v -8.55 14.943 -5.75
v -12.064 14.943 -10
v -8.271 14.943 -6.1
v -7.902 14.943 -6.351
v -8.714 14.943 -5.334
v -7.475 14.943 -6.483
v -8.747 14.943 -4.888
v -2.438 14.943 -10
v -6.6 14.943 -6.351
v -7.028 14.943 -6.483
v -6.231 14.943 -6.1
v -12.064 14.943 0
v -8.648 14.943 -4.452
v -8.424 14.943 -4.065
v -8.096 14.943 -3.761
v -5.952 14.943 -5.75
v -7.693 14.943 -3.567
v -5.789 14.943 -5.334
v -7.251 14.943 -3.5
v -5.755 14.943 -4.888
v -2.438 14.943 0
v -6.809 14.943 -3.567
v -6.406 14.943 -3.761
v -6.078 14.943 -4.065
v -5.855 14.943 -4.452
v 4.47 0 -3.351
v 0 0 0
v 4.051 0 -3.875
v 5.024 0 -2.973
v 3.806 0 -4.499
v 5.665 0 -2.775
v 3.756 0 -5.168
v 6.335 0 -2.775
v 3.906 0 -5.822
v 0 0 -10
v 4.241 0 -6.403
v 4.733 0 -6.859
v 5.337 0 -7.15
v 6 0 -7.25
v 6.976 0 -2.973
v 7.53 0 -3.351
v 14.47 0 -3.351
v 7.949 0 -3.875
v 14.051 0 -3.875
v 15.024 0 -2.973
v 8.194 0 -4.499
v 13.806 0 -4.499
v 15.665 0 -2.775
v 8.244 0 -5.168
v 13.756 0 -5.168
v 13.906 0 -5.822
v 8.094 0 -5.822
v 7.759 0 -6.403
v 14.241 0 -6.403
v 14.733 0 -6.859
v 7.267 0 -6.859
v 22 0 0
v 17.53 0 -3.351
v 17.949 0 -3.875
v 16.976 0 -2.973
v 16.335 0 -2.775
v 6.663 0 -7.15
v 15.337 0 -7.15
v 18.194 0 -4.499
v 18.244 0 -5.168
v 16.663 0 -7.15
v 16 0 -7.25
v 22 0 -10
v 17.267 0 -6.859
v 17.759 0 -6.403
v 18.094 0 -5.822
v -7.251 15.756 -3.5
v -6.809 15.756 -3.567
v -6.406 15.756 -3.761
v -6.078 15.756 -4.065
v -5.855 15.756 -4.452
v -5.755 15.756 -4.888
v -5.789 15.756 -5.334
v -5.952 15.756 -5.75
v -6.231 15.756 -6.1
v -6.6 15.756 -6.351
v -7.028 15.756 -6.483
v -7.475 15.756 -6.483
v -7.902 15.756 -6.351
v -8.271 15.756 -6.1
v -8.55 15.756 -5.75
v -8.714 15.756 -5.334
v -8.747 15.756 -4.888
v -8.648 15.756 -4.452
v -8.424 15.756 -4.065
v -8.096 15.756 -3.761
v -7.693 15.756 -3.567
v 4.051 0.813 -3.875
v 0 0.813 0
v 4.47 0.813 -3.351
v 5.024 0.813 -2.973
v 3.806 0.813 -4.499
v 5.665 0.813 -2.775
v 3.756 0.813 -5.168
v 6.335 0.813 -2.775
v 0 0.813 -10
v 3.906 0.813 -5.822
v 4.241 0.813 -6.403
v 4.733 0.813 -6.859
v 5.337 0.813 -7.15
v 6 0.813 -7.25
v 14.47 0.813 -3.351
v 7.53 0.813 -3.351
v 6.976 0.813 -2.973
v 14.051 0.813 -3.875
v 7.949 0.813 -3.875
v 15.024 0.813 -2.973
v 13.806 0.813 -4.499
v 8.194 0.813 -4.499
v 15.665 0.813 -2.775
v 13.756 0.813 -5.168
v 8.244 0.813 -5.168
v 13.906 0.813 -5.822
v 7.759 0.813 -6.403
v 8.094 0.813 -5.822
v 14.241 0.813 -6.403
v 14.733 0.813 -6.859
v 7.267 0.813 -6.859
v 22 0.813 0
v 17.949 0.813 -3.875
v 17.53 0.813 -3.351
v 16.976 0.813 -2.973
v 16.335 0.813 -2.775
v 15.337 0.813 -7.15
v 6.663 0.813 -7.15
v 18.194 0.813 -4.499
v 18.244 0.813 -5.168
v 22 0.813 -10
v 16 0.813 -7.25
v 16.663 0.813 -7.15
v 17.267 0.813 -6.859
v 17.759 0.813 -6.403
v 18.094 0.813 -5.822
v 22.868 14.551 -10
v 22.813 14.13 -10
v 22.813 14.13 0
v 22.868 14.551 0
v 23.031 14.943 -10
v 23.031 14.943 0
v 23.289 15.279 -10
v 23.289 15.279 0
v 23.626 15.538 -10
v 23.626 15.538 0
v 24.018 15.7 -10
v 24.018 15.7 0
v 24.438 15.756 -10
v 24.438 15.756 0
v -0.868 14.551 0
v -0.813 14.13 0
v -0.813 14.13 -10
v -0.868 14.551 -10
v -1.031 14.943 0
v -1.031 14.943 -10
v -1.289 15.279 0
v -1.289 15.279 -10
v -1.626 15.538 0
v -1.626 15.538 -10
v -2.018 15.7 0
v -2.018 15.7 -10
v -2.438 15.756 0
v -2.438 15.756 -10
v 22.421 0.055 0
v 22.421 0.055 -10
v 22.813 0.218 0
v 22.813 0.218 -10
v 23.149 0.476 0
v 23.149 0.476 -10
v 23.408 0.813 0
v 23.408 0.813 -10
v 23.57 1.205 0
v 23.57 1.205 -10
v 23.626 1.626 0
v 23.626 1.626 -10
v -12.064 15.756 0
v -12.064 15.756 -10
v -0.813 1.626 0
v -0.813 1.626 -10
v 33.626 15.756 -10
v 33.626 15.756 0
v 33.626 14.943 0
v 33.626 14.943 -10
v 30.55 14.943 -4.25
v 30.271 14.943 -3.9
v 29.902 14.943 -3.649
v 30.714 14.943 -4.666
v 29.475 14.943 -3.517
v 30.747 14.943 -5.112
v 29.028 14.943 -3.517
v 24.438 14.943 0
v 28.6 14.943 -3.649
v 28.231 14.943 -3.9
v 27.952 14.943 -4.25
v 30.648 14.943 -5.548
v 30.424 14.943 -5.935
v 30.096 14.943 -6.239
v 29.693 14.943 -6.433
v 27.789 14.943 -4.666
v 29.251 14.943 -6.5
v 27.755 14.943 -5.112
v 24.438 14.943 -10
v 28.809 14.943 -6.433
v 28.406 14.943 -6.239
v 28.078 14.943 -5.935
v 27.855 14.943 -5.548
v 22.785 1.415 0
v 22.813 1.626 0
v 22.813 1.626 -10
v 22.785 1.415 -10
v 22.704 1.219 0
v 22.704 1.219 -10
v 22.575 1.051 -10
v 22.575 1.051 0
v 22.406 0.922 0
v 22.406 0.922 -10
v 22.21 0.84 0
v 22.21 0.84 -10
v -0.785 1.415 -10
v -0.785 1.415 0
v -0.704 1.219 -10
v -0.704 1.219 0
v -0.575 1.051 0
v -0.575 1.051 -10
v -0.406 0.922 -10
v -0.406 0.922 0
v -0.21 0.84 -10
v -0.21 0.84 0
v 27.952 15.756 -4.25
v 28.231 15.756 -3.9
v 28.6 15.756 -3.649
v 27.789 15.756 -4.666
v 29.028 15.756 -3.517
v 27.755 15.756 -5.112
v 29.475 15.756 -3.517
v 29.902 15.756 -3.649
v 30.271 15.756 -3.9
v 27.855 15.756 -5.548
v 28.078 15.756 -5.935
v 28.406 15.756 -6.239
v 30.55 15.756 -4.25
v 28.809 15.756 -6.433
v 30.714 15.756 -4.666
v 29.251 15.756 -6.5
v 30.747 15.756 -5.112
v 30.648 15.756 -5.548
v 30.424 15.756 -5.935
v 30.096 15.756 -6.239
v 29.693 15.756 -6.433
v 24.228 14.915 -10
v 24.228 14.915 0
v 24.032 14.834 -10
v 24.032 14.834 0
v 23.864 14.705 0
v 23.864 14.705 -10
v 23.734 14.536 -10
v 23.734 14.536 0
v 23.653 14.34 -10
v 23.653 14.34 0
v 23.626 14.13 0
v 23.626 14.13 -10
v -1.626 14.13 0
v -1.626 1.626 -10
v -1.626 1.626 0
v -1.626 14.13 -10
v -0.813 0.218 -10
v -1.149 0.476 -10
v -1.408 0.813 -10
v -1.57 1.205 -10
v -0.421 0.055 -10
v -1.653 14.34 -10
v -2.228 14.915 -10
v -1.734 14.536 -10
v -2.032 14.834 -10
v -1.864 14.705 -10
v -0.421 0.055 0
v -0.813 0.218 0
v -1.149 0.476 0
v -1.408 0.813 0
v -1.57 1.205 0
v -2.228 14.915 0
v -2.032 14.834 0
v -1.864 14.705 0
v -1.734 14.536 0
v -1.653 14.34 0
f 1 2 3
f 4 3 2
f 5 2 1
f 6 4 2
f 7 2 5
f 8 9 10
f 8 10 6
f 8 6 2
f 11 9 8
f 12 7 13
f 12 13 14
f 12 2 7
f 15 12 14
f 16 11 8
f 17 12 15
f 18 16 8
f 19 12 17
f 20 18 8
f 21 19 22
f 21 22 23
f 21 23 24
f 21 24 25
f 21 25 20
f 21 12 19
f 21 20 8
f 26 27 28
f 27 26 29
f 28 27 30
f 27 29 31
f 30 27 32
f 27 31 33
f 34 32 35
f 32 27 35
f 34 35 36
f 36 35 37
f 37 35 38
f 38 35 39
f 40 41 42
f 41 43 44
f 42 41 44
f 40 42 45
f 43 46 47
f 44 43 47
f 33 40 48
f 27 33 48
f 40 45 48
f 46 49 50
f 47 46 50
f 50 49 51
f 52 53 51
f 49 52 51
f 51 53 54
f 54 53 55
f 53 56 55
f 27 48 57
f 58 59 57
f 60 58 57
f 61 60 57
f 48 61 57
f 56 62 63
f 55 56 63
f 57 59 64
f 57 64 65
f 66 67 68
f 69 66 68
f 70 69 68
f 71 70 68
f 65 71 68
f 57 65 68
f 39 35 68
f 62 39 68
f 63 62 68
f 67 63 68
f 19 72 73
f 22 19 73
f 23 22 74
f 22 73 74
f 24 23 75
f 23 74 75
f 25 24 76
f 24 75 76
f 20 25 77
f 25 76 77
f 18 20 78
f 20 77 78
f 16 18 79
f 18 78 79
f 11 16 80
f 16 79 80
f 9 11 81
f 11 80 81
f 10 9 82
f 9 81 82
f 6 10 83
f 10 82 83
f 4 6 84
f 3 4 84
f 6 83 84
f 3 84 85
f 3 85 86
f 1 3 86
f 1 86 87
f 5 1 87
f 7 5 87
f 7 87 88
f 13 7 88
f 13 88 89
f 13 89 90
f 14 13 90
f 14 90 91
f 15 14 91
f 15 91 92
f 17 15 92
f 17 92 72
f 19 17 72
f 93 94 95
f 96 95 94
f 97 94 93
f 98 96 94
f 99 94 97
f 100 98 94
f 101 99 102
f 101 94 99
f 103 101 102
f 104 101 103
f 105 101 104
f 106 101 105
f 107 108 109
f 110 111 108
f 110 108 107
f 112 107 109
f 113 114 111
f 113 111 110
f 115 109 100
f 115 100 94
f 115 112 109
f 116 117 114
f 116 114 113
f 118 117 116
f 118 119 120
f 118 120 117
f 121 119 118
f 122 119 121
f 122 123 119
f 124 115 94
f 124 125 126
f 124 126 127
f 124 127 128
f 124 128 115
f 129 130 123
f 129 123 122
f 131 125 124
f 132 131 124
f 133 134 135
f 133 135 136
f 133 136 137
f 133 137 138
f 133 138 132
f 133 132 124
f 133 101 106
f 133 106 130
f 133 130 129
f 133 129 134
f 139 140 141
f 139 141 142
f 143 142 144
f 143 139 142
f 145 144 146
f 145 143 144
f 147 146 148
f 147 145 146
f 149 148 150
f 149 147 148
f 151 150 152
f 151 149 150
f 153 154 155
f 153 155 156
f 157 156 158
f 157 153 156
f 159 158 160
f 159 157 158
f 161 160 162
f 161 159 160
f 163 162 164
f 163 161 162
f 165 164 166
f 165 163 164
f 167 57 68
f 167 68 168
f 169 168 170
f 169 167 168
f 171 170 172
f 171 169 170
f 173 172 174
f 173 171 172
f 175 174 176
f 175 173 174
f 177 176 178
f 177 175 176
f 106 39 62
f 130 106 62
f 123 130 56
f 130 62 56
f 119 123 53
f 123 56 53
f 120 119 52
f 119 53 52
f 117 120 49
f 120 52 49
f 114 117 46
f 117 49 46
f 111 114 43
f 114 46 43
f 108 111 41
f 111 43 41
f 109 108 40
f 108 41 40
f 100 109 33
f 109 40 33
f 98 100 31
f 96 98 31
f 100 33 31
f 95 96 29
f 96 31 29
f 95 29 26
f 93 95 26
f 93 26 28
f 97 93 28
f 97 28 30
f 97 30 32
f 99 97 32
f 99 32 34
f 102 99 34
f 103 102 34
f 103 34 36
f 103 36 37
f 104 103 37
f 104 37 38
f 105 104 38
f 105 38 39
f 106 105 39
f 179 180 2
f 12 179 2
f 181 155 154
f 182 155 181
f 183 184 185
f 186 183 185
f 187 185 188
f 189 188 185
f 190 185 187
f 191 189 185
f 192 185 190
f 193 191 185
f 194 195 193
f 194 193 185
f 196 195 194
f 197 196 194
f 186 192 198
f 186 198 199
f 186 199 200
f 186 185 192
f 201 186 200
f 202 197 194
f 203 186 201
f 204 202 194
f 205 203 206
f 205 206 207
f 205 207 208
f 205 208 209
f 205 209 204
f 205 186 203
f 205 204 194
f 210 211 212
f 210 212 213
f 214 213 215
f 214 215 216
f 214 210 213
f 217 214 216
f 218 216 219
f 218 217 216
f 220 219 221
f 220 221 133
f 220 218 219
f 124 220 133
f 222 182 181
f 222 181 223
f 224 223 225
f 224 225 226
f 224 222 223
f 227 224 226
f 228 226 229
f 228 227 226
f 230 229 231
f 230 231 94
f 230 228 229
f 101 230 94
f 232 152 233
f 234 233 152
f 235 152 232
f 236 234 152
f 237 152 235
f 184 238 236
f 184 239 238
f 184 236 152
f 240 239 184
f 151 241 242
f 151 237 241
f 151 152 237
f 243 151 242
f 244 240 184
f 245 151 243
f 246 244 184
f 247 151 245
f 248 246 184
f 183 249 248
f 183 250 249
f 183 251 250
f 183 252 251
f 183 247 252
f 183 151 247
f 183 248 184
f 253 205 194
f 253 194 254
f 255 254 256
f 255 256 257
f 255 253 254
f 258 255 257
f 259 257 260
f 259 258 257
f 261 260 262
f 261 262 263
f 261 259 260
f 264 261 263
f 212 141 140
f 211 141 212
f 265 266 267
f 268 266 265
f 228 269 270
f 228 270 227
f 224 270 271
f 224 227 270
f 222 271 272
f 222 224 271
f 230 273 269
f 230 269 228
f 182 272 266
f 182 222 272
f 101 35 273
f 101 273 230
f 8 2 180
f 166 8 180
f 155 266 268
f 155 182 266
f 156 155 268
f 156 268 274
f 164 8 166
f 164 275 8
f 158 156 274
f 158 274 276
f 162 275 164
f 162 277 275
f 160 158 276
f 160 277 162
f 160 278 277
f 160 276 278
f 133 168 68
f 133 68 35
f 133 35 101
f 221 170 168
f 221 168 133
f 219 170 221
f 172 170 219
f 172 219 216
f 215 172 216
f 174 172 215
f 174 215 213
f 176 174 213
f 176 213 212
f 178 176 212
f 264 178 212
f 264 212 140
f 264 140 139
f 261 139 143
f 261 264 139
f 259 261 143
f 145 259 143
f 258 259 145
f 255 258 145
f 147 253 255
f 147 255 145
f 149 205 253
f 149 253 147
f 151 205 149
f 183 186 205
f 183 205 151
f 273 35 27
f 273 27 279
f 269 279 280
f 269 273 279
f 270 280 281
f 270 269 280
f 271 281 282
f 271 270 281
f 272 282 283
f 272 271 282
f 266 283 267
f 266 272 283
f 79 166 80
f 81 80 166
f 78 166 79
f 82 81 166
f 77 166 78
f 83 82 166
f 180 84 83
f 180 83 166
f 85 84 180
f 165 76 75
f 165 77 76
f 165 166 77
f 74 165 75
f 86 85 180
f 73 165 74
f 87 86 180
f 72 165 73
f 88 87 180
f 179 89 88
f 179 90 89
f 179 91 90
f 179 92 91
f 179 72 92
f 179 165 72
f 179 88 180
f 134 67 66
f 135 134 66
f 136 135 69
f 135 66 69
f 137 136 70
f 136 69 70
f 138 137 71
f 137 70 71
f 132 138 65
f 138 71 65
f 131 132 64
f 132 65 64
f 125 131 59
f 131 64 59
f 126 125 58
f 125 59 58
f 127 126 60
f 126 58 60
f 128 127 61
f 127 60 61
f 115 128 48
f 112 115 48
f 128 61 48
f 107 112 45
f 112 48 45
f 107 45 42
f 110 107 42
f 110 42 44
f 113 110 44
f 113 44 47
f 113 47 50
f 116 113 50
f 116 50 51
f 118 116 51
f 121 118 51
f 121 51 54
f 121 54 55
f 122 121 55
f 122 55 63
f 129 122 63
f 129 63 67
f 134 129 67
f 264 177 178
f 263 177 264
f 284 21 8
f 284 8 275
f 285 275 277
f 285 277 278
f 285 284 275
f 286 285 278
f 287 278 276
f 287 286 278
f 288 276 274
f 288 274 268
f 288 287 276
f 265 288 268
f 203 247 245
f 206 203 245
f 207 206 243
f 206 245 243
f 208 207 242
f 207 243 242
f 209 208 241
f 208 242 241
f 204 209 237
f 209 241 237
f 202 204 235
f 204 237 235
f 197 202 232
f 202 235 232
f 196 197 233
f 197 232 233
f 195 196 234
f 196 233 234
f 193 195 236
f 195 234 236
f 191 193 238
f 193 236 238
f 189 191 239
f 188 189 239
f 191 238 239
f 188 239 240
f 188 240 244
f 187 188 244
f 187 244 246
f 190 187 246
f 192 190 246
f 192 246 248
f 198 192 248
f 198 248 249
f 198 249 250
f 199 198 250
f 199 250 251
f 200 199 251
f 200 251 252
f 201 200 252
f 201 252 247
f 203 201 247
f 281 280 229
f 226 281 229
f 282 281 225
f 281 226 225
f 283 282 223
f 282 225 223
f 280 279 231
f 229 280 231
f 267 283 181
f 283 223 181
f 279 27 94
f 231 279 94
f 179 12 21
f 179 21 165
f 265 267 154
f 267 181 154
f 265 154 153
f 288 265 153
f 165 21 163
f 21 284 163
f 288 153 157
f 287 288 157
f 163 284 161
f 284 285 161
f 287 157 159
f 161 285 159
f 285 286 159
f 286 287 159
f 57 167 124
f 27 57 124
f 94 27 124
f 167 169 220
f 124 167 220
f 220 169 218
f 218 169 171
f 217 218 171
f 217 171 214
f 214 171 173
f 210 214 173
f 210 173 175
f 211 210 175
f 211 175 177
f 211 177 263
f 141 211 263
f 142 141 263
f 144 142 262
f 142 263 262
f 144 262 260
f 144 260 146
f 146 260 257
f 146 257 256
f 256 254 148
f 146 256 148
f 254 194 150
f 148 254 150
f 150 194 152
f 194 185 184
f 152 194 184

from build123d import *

# Parameters (mm, degrees)
SKETCH2_W                    = 22
SKETCH2_H                    = 10
BOSS_EXTRUDE1_DEPTH          = 0.8128
EDGE_FLANGE1_DEPTH           = 10
EDGE_FLANGE2_DEPTH           = 10
EDGE_FLANGE3_STRIP_W         = 4.8768
EDGE_FLANGE3_STRIP_H         = 0.8128
EDGE_FLANGE3_STRIP_CUT_DEPTH = 10
EDGE_FLANGE3_DEPTH           = 10
EDGE_FLANGE4_STRIP_W         = 4.8768
EDGE_FLANGE4_STRIP_H         = 0.8128
EDGE_FLANGE4_STRIP_CUT_DEPTH = 10
EDGE_FLANGE4_DEPTH           = 10
CUT_EXTRUDE1_REACH           = 40.457
SKETCH21_R                   = 1.5
CUT_EXTRUDE2_REACH           = 40.457
SKETCH22_R                   = 2.25


# Sheet-metal steps are written as plain solids
with BuildPart() as part:
    # Sketch2 → Boss-Extrude1 (new body)
    with BuildSketch(Plane(origin=(0, 0, 0), x_dir=(1, 0, 0), z_dir=(0, 1, 0))):
        with Locations((11, 5)):
            Rectangle(SKETCH2_W, SKETCH2_H)
    extrude(amount=BOSS_EXTRUDE1_DEPTH)

    # Edge-Flange1 section (across the edge) → Edge-Flange1 (add)
    with BuildSketch(Plane(origin=(-0.8128, 0.8128, -10), x_dir=(1, 0, 0), z_dir=(0, 0, 1))):
        with BuildLine():
            Line((-0.8128, 0.8128), (-0.8128, 14.13))
            Line((-0.8128, 14.13), (0, 14.13))
            Line((0, 14.13), (0, 0.8128))
            ThreePointArc((0, 0.8128), (0.238063608, 0.238063608), (0.8128, 0))
            Line((0.8128, 0), (0.8128, -0.8128))
            ThreePointArc((0.8128, -0.8128), (-0.336672783, -0.336672783), (-0.8128, 0.8128))
        make_face()
    extrude(amount=EDGE_FLANGE1_DEPTH)

    # Edge-Flange2 section (across the edge) → Edge-Flange2 (add)
    with BuildSketch(Plane(origin=(22.8128, 0.8128, 0), x_dir=(-1, 0, 0), z_dir=(0, 0, -1))):
        with BuildLine():
            Line((-0.8128, 0.8128), (-0.8128, 14.13))
            Line((-0.8128, 14.13), (0, 14.13))
            Line((0, 14.13), (0, 0.8128))
            ThreePointArc((0, 0.8128), (0.238063608, 0.238063608), (0.8128, 0))
            Line((0.8128, 0), (0.8128, -0.8128))
            ThreePointArc((0.8128, -0.8128), (-0.336672783, -0.336672783), (-0.8128, 0.8128))
        make_face()
    extrude(amount=EDGE_FLANGE2_DEPTH)

    # Edge-Flange3 strip (across the edge) → Edge-Flange3 strip cut (cut)
    with BuildSketch(Plane(origin=(-1.6256, 14.9428, 0), x_dir=(0, -1, 0), z_dir=(0, 0, -1))):
        with Locations((-1.6256, -0.4064)):
            Rectangle(EDGE_FLANGE3_STRIP_W, EDGE_FLANGE3_STRIP_H)
    extrude(amount=EDGE_FLANGE3_STRIP_CUT_DEPTH, mode=Mode.SUBTRACT)

    # Edge-Flange3 section (across the edge) → Edge-Flange3 (add)
    with BuildSketch(Plane(origin=(-1.6256, 14.9428, 0), x_dir=(0, -1, 0), z_dir=(0, 0, -1))):
        with BuildLine():
            Line((-0.8128, 0.8128), (-0.8128, 10.4384))
            Line((-0.8128, 10.4384), (0, 10.4384))
            Line((0, 10.4384), (0, 0.8128))
            ThreePointArc((0, 0.8128), (0.238063608, 0.238063608), (0.8128, 0))
            Line((0.8128, 0), (0.8128, -0.8128))
            ThreePointArc((0.8128, -0.8128), (-0.336672783, -0.336672783), (-0.8128, 0.8128))
        make_face()
    extrude(amount=EDGE_FLANGE3_DEPTH)

    # Edge-Flange4 strip (across the edge) → Edge-Flange4 strip cut (cut)
    with BuildSketch(Plane(origin=(23.6256, 14.9428, -10), x_dir=(0, -1, 0), z_dir=(0, 0, 1))):
        with Locations((-1.6256, -0.4064)):
            Rectangle(EDGE_FLANGE4_STRIP_W, EDGE_FLANGE4_STRIP_H)
    extrude(amount=EDGE_FLANGE4_STRIP_CUT_DEPTH, mode=Mode.SUBTRACT)

    # Edge-Flange4 section (across the edge) → Edge-Flange4 (add)
    with BuildSketch(Plane(origin=(23.6256, 14.9428, -10), x_dir=(0, -1, 0), z_dir=(0, 0, 1))):
        with BuildLine():
            Line((-0.8128, 0.8128), (-0.8128, 10))
            Line((-0.8128, 10), (0, 10))
            Line((0, 10), (0, 0.8128))
            ThreePointArc((0, 0.8128), (0.238063608, 0.238063608), (0.8128, 0))
            Line((0.8128, 0), (0.8128, -0.8128))
            ThreePointArc((0.8128, -0.8128), (-0.336672783, -0.336672783), (-0.8128, 0.8128))
        make_face()
    extrude(amount=EDGE_FLANGE4_DEPTH)

    # Sketch21 → Cut-Extrude1 (cut, up to next)
    with BuildSketch(Plane(origin=(0, 15.7556, 0), x_dir=(1, 0, 0), z_dir=(0, 1, 0)), mode=Mode.PRIVATE) as cut_extrude1_sk1:
        with Locations(Location((-7.2512, 5, 0), (0, 0, 270))):
            Circle(SKETCH21_R)
    cut_extrude1_tool1 = extrude(cut_extrude1_sk1.sketch, amount=-CUT_EXTRUDE1_REACH, mode=Mode.PRIVATE) & part.part
    # Sketch21 → Cut-Extrude1 (cut, up to next)
    with BuildSketch(Plane(origin=(0, 15.7556, 0), x_dir=(1, 0, 0), z_dir=(0, 1, 0)), mode=Mode.PRIVATE) as cut_extrude1_sk2:
        with Locations(Location((29.2512, 5, 0), (0, 0, 90))):
            Circle(SKETCH21_R)
    cut_extrude1_tool2 = extrude(cut_extrude1_sk2.sketch, amount=-CUT_EXTRUDE1_REACH, mode=Mode.PRIVATE) & part.part
    add(cut_extrude1_tool1.solids().sort_by_distance((-7.2512, 15.7556, -5))[0], mode=Mode.SUBTRACT)
    add(cut_extrude1_tool2.solids().sort_by_distance((29.2512, 15.7556, -5))[0], mode=Mode.SUBTRACT)

    # Sketch22 → Cut-Extrude2 (cut, up to next)
    with BuildSketch(Plane.XZ, mode=Mode.PRIVATE) as cut_extrude2_sk1:
        with Locations(Location((6, -5, 0), (0, 0, 270))):
            Circle(SKETCH22_R)
    cut_extrude2_tool1 = extrude(cut_extrude2_sk1.sketch, amount=-CUT_EXTRUDE2_REACH, mode=Mode.PRIVATE) & part.part
    # Sketch22 → Cut-Extrude2 (cut, up to next)
    with BuildSketch(Plane.XZ, mode=Mode.PRIVATE) as cut_extrude2_sk2:
        with Locations(Location((16, -5, 0), (0, 0, 270))):
            Circle(SKETCH22_R)
    cut_extrude2_tool2 = extrude(cut_extrude2_sk2.sketch, amount=-CUT_EXTRUDE2_REACH, mode=Mode.PRIVATE) & part.part
    add(cut_extrude2_tool1.solids().sort_by_distance((6, 0, -5))[0], mode=Mode.SUBTRACT)
    add(cut_extrude2_tool2.solids().sort_by_distance((16, 0, -5))[0], mode=Mode.SUBTRACT)


solid = part.part
